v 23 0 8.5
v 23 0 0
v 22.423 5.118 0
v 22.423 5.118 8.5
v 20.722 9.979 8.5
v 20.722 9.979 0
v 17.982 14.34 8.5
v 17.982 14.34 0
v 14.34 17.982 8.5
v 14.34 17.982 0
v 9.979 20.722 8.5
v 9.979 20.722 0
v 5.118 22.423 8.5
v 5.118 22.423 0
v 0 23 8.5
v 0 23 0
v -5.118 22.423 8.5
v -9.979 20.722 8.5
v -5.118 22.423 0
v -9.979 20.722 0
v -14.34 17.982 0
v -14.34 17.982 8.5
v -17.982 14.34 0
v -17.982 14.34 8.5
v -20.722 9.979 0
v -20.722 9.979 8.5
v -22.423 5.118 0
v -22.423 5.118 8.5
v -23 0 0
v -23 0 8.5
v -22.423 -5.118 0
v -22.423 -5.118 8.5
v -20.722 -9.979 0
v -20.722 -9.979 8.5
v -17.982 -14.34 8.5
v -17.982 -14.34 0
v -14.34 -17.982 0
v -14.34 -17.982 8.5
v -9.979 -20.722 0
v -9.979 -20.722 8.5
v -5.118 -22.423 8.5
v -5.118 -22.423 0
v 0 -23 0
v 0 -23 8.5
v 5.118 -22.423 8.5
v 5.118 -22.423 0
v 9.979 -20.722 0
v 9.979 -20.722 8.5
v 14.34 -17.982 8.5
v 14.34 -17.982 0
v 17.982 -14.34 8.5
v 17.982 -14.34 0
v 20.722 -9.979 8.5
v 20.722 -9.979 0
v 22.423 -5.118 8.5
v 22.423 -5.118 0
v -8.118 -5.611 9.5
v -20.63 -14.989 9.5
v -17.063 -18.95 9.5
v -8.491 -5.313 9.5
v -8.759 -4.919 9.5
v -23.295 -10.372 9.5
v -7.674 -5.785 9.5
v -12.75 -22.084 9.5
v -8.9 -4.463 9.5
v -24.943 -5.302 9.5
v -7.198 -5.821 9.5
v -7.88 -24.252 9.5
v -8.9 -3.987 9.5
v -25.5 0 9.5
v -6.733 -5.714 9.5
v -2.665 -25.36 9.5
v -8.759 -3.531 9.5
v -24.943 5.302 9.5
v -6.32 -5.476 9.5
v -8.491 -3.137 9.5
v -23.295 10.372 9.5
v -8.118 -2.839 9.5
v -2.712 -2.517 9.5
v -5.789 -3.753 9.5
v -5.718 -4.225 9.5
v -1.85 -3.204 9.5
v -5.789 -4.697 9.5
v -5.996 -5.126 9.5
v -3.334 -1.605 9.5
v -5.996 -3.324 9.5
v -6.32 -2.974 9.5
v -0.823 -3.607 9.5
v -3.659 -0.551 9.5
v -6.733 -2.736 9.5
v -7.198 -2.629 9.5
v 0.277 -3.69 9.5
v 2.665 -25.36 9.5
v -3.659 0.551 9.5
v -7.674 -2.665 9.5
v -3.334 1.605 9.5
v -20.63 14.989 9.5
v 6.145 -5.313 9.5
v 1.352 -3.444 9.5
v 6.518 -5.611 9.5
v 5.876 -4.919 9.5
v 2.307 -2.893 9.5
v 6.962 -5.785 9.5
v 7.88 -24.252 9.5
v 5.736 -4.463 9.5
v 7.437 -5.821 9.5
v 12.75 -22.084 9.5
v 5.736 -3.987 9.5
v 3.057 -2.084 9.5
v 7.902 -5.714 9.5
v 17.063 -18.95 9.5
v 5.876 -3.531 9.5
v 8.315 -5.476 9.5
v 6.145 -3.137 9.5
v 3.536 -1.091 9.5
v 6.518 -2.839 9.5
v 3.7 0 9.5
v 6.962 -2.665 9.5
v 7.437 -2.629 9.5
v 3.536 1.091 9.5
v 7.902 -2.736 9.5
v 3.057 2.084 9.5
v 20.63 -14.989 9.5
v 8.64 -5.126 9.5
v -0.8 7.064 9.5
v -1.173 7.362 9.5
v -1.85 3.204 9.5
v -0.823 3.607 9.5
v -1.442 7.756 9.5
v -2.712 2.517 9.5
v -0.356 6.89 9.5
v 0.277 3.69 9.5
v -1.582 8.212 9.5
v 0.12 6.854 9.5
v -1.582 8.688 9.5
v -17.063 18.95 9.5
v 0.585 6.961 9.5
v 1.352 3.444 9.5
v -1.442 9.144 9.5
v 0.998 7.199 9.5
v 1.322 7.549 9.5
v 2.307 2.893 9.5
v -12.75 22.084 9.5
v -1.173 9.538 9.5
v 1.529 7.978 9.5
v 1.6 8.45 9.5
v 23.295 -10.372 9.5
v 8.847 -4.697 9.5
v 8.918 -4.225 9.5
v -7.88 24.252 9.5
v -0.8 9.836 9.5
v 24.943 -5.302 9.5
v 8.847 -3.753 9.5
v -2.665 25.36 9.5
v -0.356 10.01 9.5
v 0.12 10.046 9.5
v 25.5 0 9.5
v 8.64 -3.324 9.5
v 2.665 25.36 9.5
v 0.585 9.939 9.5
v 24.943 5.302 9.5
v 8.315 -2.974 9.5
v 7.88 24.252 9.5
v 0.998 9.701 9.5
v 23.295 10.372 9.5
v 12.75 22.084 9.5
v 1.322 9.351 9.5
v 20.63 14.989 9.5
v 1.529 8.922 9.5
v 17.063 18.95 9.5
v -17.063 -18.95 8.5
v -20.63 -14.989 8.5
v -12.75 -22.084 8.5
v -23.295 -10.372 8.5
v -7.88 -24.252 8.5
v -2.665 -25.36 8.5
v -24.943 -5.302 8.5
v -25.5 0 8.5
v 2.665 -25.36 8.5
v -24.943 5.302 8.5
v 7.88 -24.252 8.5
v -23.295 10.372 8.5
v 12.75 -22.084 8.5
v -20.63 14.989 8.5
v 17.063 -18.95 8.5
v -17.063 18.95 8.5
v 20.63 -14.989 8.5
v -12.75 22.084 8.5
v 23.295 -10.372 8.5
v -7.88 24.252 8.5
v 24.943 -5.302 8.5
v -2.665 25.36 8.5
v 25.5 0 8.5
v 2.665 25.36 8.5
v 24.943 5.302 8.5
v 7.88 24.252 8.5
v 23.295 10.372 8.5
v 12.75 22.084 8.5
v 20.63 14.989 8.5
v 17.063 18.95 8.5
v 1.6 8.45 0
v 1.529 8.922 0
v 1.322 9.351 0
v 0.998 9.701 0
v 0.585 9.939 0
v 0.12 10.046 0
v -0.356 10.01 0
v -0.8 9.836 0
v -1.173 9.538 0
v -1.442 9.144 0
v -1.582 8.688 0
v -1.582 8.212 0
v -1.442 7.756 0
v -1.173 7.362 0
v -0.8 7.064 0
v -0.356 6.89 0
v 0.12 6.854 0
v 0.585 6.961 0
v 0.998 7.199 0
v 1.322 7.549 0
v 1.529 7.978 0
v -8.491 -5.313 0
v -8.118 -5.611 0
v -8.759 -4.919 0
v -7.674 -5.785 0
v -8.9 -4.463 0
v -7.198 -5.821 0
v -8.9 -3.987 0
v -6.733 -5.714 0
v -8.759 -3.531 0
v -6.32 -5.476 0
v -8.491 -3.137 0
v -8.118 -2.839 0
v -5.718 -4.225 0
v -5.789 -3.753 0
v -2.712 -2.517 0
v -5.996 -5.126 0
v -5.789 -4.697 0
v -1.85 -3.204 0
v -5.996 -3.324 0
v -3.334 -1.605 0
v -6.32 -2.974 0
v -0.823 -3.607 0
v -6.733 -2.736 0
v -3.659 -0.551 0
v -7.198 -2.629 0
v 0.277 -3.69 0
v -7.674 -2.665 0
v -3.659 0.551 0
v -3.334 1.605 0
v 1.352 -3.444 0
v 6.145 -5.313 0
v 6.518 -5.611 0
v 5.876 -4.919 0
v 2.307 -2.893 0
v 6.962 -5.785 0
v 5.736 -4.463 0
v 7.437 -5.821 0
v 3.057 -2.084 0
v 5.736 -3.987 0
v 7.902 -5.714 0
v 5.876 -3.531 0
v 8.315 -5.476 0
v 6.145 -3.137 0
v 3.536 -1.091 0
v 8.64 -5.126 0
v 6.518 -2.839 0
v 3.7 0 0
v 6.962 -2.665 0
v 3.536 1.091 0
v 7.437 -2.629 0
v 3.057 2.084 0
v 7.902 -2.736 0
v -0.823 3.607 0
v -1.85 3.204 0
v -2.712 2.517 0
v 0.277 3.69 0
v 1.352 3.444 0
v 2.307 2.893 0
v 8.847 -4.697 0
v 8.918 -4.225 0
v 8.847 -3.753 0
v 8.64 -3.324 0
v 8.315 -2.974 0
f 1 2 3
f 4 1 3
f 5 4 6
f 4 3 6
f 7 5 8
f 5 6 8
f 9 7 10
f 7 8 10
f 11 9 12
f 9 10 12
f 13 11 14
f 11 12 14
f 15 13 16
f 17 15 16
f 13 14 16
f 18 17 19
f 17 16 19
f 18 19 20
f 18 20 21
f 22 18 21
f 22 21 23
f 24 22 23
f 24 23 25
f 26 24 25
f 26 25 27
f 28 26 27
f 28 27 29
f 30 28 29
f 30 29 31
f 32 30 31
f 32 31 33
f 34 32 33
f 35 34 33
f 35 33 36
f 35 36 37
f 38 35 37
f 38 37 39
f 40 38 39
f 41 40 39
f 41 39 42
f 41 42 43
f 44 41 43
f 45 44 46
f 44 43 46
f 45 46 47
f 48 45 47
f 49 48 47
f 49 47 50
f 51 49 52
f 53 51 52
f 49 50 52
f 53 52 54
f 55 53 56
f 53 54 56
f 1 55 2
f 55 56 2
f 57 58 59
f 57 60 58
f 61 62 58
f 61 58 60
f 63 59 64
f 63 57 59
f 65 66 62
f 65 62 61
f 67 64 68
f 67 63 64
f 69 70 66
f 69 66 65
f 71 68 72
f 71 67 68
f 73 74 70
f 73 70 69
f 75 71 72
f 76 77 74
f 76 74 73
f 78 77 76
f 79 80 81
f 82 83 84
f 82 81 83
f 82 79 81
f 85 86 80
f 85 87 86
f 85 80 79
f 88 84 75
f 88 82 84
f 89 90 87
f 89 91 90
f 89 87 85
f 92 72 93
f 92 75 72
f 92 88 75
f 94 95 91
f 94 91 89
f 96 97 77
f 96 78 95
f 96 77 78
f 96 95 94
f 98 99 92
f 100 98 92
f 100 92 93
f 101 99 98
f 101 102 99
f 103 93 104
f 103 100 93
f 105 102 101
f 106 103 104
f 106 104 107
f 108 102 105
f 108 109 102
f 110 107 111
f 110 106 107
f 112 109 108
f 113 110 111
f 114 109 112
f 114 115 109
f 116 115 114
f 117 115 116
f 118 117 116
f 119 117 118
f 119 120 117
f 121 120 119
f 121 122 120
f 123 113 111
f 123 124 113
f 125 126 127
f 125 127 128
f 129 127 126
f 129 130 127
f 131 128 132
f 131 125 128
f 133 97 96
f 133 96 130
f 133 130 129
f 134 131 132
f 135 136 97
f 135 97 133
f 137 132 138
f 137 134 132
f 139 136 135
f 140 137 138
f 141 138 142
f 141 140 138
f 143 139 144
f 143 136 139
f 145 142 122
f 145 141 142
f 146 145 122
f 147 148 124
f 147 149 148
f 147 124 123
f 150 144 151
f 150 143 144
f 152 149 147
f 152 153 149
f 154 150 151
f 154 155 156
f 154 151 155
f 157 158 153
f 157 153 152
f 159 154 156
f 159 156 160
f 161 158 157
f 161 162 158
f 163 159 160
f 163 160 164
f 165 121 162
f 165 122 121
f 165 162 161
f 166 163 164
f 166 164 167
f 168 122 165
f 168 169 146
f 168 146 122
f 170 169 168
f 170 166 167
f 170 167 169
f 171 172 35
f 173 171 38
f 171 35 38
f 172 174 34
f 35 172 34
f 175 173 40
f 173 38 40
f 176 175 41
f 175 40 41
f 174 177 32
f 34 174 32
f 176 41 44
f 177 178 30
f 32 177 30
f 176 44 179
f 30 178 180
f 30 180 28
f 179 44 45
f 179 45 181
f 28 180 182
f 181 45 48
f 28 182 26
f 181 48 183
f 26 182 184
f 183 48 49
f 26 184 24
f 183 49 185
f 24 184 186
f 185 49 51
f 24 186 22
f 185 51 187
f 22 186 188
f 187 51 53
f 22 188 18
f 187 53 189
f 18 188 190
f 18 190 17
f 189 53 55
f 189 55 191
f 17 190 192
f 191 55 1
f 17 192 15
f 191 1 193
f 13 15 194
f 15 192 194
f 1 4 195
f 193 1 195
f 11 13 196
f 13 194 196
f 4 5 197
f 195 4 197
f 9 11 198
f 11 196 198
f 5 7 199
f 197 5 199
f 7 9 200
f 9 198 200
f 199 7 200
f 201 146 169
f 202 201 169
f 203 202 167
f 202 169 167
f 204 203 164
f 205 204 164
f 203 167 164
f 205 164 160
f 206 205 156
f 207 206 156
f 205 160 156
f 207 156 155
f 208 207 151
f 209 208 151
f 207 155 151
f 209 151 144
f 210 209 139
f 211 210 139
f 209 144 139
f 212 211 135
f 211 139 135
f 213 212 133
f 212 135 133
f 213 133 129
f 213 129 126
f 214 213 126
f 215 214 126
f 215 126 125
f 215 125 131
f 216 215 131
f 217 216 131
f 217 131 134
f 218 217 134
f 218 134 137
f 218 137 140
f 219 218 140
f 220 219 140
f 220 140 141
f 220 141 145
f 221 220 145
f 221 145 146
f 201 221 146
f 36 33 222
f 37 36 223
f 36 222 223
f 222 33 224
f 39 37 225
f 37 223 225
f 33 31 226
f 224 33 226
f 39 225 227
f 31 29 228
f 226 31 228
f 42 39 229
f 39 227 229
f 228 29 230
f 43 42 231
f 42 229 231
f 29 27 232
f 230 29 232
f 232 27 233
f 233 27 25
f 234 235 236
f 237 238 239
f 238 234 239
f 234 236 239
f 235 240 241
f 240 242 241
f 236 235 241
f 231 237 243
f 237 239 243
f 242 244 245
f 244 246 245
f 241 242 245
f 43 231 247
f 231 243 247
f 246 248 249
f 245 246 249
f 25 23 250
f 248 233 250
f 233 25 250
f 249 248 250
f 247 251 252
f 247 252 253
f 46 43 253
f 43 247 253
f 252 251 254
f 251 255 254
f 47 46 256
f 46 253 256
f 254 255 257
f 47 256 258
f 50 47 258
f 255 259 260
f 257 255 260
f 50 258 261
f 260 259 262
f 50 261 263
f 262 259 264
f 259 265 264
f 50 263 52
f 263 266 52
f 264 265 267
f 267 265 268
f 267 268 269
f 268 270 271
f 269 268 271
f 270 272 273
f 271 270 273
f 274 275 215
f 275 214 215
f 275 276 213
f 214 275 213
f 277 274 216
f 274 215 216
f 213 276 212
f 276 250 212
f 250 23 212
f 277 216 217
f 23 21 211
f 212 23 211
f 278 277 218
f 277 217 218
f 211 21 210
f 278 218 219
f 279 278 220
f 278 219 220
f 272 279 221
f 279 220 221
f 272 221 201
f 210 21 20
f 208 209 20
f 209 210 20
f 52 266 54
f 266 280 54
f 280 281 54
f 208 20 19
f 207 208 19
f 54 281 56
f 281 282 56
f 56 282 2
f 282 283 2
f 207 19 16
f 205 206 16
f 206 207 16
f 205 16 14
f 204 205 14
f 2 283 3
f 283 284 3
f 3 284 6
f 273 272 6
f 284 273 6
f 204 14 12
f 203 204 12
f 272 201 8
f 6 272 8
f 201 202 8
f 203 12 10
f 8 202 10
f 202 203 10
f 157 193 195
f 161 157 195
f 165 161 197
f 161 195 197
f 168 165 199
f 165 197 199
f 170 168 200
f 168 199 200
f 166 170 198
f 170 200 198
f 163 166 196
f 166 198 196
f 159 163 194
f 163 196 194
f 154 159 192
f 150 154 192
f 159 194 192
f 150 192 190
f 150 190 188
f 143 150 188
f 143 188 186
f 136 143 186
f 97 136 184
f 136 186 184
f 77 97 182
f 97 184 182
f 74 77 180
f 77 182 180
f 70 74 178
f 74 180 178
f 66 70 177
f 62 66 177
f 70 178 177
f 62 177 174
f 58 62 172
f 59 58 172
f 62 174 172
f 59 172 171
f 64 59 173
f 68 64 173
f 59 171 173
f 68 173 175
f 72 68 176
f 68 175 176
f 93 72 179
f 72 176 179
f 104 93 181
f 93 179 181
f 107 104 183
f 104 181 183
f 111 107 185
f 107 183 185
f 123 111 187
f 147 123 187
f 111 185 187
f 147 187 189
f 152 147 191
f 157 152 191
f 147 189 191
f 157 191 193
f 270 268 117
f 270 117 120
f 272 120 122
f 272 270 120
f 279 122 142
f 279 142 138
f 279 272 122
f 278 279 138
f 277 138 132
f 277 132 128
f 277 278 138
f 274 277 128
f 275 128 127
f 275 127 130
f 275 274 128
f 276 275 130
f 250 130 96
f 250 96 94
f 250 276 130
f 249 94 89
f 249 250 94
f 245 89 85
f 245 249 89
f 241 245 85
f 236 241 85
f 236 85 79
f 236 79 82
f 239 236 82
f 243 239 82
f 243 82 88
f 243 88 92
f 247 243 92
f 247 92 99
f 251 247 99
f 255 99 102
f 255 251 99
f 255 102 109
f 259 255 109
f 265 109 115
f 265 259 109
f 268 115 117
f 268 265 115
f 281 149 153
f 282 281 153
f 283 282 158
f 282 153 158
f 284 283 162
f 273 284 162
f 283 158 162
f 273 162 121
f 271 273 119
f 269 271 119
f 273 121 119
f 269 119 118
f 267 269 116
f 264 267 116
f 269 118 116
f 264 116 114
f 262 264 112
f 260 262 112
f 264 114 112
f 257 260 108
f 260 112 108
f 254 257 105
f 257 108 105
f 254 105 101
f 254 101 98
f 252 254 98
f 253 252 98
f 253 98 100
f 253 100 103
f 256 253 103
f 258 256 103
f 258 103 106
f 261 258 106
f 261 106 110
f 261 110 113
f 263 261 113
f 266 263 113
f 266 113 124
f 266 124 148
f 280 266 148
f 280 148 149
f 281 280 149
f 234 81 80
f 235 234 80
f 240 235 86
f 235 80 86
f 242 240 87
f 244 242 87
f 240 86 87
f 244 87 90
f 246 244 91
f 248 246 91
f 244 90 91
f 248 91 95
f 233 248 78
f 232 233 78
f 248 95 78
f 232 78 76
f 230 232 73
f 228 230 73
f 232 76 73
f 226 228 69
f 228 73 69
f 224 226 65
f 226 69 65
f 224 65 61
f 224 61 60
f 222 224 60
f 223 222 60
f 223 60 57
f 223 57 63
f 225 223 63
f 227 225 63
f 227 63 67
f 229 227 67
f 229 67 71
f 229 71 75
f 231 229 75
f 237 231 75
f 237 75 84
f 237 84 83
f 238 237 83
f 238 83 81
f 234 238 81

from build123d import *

# Parameters (mm, degrees)
SKETCH1_R           = 23
SKETCH1_R_2         = 3.7
BOSS_EXTRUDE1_DEPTH = 9.5
BOSS_EXTRUDE3_START = -1
SKETCH9_R           = 25.5
SKETCH9_R_2         = 23
BOSS_EXTRUDE3_DEPTH = 1
HOLE1_D             = 3.2


with BuildPart() as part:
    # Sketch1 → Boss-Extrude1 (new body)
    with BuildSketch(Plane.XY):
        Circle(SKETCH1_R)
        Circle(SKETCH1_R_2, mode=Mode.SUBTRACT)
    extrude(amount=BOSS_EXTRUDE1_DEPTH)

    # Sketch9 → Boss-Extrude3 (add)
    with BuildSketch(Plane.XY.offset(9.5).offset(BOSS_EXTRUDE3_START)):
        Circle(SKETCH9_R)
        Circle(SKETCH9_R_2, mode=Mode.SUBTRACT)
    extrude(amount=BOSS_EXTRUDE3_DEPTH)

    # Hole1 (through all)
    with Locations(Plane(origin=(0, 8.45, 0), x_dir=(-1, 0, 0), z_dir=(0, 0, -1))):
        with Locations((0, 0), (-7.317914662, -12.675), (7.317914662, -12.675)):
            Hole(HOLE1_D / 2)


solid = part.part
